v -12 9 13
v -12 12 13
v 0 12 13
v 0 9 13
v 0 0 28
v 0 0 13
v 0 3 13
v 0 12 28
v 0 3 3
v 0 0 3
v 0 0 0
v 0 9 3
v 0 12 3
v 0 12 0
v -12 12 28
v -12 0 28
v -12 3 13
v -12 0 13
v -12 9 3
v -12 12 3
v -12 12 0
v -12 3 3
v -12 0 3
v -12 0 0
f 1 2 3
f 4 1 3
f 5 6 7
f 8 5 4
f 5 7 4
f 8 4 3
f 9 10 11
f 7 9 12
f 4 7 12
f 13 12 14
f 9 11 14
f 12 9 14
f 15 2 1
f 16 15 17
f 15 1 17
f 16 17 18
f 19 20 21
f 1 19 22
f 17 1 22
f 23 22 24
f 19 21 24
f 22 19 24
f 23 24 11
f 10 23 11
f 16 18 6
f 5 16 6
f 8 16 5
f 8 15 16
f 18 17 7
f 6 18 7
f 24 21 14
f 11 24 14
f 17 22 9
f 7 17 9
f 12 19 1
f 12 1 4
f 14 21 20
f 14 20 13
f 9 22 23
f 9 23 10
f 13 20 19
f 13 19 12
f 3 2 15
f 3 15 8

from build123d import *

# Parameters (mm, degrees)
F0_W     = 12
F0_H     = 12
F1_DEPTH = 3
F2_W     = 12
F2_H     = 6
F3_DEPTH = 10
F4_W     = 12
F4_H     = 3
F4_H_2   = 6
F5_DEPTH = 15


with BuildPart() as f1:
    # F0 (on Top) → F1 (new body)
    with BuildSketch(Plane.XY):
        with Locations((-6, 6)):
            Rectangle(F0_W, F0_H)
    extrude(amount=F1_DEPTH)

    # F2 (on face) → F3 (join)
    with BuildSketch(Plane.XY.offset(3)):
        with Locations((-6, 6)):
            Rectangle(F2_W, F2_H)
    extrude(amount=F3_DEPTH)

    # F4 (on face) → F5 (join)
    with BuildSketch(Plane.XY.offset(13)):
        with Locations((-6, 1.5)):
            Rectangle(F4_W, F4_H)
        with Locations((-6, 6)):
            Rectangle(F4_W, F4_H_2)
        with Locations((-6, 10.5)):
            Rectangle(F4_W, F4_H)
    extrude(amount=F5_DEPTH)


solid = f1.part
